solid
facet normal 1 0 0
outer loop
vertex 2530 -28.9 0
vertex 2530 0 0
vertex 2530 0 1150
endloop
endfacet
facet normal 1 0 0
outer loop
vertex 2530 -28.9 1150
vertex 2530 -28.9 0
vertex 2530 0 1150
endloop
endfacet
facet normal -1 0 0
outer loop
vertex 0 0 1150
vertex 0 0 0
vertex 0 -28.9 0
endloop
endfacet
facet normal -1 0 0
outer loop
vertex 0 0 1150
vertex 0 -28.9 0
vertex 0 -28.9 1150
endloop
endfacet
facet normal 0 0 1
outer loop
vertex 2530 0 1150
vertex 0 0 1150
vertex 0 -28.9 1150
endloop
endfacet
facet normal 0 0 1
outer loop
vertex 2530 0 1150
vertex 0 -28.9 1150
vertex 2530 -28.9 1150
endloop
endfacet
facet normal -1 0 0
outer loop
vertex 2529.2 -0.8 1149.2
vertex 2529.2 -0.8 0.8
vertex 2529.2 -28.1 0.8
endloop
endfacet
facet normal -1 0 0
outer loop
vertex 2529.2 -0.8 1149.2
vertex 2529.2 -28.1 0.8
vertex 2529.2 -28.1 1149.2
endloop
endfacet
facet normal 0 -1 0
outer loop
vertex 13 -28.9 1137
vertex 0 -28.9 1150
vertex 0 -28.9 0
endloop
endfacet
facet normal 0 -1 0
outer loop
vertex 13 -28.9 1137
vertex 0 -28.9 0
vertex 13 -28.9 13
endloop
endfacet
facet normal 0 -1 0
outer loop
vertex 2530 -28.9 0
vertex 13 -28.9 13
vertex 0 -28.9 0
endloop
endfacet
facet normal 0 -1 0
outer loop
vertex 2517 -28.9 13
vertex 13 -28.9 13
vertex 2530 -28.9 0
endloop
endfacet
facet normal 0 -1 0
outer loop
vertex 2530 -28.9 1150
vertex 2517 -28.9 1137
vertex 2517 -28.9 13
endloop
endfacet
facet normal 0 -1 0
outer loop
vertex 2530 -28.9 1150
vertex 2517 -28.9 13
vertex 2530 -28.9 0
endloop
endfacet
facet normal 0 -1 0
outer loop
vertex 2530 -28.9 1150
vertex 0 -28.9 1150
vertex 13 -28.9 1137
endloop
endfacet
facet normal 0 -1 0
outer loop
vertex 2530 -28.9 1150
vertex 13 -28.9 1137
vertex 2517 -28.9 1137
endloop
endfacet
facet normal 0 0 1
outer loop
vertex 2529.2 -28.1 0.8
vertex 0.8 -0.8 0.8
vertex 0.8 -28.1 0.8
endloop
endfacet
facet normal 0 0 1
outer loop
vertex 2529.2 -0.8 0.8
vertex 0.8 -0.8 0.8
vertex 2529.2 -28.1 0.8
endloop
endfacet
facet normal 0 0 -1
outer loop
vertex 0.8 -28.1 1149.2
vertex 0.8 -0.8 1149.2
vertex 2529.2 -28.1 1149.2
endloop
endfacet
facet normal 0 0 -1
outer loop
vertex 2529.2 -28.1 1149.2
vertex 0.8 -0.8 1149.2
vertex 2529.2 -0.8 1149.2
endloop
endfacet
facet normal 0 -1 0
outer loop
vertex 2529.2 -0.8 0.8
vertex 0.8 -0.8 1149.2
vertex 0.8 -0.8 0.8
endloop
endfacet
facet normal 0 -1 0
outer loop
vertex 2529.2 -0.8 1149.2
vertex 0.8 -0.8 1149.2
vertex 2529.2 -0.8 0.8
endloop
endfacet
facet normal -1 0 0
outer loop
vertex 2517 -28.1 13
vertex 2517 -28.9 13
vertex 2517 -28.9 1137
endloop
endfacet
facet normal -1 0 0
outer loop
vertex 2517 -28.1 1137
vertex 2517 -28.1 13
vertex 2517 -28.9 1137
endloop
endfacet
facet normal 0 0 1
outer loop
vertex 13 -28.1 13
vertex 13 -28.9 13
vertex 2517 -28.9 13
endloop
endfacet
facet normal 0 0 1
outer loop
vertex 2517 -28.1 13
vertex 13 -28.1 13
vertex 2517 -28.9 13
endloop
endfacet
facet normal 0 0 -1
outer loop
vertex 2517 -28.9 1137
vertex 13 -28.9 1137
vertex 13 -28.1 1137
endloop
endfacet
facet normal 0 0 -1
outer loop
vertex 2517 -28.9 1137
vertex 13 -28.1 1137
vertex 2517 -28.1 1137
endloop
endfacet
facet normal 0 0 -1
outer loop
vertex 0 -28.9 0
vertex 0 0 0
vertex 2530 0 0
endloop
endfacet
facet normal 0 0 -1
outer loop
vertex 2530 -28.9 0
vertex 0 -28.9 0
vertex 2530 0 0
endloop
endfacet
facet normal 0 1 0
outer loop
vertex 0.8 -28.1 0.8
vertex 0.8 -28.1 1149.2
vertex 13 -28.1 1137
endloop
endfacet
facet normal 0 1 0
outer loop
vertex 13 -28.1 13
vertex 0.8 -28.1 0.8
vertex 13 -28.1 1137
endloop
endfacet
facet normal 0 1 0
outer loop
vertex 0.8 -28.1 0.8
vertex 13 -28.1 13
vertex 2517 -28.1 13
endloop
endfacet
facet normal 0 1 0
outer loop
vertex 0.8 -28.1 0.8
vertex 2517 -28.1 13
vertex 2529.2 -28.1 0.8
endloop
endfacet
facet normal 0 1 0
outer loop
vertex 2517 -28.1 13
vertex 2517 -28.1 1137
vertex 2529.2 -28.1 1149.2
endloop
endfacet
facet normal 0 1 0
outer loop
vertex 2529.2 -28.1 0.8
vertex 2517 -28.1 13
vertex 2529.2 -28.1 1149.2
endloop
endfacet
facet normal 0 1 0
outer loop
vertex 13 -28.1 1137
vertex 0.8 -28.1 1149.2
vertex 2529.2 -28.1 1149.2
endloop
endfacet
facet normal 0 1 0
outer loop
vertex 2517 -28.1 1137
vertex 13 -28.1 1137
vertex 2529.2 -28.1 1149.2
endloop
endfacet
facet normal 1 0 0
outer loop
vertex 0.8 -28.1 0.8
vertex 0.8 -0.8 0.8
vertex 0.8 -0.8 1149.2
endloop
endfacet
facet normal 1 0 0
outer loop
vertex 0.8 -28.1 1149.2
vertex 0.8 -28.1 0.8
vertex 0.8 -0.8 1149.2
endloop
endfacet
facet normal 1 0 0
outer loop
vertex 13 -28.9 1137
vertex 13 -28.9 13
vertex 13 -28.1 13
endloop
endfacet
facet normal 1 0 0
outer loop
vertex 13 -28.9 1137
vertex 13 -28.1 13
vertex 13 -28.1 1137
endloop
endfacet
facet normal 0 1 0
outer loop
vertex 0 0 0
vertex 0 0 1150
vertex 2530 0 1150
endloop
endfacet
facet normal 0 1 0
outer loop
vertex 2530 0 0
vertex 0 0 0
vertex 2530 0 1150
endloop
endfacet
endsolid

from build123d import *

# Parameters (mm, degrees)
F0_W     = 2530
F0_H     = 1150
F1_DEPTH = 28.9
F2_W     = 2504
F2_H     = 1124
F3_DEPTH = 28.1
F4_W     = 2528.4
F4_H     = 1148.4
F5_DEPTH = 27.3


with BuildPart() as f1:
    # F0 (on Front) → F1 (new body)
    with BuildSketch(Plane.XZ):
        with Locations((1265, 575)):
            Rectangle(F0_W, F0_H)
    extrude(amount=F1_DEPTH)

    # F2 (on face) → F3 (cut)
    with BuildSketch(Plane.XZ.offset(28.9)):
        with Locations((1265, 575)):
            Rectangle(F2_W, F2_H)
    extrude(amount=-F3_DEPTH, mode=Mode.SUBTRACT)

    # F4 (on face) → F5 (cut)
    with BuildSketch(Plane.XZ.offset(0.8)):
        with Locations((1265, 575)):
            Rectangle(F4_W, F4_H)
    extrude(amount=F5_DEPTH, mode=Mode.SUBTRACT)


solid = f1.part
